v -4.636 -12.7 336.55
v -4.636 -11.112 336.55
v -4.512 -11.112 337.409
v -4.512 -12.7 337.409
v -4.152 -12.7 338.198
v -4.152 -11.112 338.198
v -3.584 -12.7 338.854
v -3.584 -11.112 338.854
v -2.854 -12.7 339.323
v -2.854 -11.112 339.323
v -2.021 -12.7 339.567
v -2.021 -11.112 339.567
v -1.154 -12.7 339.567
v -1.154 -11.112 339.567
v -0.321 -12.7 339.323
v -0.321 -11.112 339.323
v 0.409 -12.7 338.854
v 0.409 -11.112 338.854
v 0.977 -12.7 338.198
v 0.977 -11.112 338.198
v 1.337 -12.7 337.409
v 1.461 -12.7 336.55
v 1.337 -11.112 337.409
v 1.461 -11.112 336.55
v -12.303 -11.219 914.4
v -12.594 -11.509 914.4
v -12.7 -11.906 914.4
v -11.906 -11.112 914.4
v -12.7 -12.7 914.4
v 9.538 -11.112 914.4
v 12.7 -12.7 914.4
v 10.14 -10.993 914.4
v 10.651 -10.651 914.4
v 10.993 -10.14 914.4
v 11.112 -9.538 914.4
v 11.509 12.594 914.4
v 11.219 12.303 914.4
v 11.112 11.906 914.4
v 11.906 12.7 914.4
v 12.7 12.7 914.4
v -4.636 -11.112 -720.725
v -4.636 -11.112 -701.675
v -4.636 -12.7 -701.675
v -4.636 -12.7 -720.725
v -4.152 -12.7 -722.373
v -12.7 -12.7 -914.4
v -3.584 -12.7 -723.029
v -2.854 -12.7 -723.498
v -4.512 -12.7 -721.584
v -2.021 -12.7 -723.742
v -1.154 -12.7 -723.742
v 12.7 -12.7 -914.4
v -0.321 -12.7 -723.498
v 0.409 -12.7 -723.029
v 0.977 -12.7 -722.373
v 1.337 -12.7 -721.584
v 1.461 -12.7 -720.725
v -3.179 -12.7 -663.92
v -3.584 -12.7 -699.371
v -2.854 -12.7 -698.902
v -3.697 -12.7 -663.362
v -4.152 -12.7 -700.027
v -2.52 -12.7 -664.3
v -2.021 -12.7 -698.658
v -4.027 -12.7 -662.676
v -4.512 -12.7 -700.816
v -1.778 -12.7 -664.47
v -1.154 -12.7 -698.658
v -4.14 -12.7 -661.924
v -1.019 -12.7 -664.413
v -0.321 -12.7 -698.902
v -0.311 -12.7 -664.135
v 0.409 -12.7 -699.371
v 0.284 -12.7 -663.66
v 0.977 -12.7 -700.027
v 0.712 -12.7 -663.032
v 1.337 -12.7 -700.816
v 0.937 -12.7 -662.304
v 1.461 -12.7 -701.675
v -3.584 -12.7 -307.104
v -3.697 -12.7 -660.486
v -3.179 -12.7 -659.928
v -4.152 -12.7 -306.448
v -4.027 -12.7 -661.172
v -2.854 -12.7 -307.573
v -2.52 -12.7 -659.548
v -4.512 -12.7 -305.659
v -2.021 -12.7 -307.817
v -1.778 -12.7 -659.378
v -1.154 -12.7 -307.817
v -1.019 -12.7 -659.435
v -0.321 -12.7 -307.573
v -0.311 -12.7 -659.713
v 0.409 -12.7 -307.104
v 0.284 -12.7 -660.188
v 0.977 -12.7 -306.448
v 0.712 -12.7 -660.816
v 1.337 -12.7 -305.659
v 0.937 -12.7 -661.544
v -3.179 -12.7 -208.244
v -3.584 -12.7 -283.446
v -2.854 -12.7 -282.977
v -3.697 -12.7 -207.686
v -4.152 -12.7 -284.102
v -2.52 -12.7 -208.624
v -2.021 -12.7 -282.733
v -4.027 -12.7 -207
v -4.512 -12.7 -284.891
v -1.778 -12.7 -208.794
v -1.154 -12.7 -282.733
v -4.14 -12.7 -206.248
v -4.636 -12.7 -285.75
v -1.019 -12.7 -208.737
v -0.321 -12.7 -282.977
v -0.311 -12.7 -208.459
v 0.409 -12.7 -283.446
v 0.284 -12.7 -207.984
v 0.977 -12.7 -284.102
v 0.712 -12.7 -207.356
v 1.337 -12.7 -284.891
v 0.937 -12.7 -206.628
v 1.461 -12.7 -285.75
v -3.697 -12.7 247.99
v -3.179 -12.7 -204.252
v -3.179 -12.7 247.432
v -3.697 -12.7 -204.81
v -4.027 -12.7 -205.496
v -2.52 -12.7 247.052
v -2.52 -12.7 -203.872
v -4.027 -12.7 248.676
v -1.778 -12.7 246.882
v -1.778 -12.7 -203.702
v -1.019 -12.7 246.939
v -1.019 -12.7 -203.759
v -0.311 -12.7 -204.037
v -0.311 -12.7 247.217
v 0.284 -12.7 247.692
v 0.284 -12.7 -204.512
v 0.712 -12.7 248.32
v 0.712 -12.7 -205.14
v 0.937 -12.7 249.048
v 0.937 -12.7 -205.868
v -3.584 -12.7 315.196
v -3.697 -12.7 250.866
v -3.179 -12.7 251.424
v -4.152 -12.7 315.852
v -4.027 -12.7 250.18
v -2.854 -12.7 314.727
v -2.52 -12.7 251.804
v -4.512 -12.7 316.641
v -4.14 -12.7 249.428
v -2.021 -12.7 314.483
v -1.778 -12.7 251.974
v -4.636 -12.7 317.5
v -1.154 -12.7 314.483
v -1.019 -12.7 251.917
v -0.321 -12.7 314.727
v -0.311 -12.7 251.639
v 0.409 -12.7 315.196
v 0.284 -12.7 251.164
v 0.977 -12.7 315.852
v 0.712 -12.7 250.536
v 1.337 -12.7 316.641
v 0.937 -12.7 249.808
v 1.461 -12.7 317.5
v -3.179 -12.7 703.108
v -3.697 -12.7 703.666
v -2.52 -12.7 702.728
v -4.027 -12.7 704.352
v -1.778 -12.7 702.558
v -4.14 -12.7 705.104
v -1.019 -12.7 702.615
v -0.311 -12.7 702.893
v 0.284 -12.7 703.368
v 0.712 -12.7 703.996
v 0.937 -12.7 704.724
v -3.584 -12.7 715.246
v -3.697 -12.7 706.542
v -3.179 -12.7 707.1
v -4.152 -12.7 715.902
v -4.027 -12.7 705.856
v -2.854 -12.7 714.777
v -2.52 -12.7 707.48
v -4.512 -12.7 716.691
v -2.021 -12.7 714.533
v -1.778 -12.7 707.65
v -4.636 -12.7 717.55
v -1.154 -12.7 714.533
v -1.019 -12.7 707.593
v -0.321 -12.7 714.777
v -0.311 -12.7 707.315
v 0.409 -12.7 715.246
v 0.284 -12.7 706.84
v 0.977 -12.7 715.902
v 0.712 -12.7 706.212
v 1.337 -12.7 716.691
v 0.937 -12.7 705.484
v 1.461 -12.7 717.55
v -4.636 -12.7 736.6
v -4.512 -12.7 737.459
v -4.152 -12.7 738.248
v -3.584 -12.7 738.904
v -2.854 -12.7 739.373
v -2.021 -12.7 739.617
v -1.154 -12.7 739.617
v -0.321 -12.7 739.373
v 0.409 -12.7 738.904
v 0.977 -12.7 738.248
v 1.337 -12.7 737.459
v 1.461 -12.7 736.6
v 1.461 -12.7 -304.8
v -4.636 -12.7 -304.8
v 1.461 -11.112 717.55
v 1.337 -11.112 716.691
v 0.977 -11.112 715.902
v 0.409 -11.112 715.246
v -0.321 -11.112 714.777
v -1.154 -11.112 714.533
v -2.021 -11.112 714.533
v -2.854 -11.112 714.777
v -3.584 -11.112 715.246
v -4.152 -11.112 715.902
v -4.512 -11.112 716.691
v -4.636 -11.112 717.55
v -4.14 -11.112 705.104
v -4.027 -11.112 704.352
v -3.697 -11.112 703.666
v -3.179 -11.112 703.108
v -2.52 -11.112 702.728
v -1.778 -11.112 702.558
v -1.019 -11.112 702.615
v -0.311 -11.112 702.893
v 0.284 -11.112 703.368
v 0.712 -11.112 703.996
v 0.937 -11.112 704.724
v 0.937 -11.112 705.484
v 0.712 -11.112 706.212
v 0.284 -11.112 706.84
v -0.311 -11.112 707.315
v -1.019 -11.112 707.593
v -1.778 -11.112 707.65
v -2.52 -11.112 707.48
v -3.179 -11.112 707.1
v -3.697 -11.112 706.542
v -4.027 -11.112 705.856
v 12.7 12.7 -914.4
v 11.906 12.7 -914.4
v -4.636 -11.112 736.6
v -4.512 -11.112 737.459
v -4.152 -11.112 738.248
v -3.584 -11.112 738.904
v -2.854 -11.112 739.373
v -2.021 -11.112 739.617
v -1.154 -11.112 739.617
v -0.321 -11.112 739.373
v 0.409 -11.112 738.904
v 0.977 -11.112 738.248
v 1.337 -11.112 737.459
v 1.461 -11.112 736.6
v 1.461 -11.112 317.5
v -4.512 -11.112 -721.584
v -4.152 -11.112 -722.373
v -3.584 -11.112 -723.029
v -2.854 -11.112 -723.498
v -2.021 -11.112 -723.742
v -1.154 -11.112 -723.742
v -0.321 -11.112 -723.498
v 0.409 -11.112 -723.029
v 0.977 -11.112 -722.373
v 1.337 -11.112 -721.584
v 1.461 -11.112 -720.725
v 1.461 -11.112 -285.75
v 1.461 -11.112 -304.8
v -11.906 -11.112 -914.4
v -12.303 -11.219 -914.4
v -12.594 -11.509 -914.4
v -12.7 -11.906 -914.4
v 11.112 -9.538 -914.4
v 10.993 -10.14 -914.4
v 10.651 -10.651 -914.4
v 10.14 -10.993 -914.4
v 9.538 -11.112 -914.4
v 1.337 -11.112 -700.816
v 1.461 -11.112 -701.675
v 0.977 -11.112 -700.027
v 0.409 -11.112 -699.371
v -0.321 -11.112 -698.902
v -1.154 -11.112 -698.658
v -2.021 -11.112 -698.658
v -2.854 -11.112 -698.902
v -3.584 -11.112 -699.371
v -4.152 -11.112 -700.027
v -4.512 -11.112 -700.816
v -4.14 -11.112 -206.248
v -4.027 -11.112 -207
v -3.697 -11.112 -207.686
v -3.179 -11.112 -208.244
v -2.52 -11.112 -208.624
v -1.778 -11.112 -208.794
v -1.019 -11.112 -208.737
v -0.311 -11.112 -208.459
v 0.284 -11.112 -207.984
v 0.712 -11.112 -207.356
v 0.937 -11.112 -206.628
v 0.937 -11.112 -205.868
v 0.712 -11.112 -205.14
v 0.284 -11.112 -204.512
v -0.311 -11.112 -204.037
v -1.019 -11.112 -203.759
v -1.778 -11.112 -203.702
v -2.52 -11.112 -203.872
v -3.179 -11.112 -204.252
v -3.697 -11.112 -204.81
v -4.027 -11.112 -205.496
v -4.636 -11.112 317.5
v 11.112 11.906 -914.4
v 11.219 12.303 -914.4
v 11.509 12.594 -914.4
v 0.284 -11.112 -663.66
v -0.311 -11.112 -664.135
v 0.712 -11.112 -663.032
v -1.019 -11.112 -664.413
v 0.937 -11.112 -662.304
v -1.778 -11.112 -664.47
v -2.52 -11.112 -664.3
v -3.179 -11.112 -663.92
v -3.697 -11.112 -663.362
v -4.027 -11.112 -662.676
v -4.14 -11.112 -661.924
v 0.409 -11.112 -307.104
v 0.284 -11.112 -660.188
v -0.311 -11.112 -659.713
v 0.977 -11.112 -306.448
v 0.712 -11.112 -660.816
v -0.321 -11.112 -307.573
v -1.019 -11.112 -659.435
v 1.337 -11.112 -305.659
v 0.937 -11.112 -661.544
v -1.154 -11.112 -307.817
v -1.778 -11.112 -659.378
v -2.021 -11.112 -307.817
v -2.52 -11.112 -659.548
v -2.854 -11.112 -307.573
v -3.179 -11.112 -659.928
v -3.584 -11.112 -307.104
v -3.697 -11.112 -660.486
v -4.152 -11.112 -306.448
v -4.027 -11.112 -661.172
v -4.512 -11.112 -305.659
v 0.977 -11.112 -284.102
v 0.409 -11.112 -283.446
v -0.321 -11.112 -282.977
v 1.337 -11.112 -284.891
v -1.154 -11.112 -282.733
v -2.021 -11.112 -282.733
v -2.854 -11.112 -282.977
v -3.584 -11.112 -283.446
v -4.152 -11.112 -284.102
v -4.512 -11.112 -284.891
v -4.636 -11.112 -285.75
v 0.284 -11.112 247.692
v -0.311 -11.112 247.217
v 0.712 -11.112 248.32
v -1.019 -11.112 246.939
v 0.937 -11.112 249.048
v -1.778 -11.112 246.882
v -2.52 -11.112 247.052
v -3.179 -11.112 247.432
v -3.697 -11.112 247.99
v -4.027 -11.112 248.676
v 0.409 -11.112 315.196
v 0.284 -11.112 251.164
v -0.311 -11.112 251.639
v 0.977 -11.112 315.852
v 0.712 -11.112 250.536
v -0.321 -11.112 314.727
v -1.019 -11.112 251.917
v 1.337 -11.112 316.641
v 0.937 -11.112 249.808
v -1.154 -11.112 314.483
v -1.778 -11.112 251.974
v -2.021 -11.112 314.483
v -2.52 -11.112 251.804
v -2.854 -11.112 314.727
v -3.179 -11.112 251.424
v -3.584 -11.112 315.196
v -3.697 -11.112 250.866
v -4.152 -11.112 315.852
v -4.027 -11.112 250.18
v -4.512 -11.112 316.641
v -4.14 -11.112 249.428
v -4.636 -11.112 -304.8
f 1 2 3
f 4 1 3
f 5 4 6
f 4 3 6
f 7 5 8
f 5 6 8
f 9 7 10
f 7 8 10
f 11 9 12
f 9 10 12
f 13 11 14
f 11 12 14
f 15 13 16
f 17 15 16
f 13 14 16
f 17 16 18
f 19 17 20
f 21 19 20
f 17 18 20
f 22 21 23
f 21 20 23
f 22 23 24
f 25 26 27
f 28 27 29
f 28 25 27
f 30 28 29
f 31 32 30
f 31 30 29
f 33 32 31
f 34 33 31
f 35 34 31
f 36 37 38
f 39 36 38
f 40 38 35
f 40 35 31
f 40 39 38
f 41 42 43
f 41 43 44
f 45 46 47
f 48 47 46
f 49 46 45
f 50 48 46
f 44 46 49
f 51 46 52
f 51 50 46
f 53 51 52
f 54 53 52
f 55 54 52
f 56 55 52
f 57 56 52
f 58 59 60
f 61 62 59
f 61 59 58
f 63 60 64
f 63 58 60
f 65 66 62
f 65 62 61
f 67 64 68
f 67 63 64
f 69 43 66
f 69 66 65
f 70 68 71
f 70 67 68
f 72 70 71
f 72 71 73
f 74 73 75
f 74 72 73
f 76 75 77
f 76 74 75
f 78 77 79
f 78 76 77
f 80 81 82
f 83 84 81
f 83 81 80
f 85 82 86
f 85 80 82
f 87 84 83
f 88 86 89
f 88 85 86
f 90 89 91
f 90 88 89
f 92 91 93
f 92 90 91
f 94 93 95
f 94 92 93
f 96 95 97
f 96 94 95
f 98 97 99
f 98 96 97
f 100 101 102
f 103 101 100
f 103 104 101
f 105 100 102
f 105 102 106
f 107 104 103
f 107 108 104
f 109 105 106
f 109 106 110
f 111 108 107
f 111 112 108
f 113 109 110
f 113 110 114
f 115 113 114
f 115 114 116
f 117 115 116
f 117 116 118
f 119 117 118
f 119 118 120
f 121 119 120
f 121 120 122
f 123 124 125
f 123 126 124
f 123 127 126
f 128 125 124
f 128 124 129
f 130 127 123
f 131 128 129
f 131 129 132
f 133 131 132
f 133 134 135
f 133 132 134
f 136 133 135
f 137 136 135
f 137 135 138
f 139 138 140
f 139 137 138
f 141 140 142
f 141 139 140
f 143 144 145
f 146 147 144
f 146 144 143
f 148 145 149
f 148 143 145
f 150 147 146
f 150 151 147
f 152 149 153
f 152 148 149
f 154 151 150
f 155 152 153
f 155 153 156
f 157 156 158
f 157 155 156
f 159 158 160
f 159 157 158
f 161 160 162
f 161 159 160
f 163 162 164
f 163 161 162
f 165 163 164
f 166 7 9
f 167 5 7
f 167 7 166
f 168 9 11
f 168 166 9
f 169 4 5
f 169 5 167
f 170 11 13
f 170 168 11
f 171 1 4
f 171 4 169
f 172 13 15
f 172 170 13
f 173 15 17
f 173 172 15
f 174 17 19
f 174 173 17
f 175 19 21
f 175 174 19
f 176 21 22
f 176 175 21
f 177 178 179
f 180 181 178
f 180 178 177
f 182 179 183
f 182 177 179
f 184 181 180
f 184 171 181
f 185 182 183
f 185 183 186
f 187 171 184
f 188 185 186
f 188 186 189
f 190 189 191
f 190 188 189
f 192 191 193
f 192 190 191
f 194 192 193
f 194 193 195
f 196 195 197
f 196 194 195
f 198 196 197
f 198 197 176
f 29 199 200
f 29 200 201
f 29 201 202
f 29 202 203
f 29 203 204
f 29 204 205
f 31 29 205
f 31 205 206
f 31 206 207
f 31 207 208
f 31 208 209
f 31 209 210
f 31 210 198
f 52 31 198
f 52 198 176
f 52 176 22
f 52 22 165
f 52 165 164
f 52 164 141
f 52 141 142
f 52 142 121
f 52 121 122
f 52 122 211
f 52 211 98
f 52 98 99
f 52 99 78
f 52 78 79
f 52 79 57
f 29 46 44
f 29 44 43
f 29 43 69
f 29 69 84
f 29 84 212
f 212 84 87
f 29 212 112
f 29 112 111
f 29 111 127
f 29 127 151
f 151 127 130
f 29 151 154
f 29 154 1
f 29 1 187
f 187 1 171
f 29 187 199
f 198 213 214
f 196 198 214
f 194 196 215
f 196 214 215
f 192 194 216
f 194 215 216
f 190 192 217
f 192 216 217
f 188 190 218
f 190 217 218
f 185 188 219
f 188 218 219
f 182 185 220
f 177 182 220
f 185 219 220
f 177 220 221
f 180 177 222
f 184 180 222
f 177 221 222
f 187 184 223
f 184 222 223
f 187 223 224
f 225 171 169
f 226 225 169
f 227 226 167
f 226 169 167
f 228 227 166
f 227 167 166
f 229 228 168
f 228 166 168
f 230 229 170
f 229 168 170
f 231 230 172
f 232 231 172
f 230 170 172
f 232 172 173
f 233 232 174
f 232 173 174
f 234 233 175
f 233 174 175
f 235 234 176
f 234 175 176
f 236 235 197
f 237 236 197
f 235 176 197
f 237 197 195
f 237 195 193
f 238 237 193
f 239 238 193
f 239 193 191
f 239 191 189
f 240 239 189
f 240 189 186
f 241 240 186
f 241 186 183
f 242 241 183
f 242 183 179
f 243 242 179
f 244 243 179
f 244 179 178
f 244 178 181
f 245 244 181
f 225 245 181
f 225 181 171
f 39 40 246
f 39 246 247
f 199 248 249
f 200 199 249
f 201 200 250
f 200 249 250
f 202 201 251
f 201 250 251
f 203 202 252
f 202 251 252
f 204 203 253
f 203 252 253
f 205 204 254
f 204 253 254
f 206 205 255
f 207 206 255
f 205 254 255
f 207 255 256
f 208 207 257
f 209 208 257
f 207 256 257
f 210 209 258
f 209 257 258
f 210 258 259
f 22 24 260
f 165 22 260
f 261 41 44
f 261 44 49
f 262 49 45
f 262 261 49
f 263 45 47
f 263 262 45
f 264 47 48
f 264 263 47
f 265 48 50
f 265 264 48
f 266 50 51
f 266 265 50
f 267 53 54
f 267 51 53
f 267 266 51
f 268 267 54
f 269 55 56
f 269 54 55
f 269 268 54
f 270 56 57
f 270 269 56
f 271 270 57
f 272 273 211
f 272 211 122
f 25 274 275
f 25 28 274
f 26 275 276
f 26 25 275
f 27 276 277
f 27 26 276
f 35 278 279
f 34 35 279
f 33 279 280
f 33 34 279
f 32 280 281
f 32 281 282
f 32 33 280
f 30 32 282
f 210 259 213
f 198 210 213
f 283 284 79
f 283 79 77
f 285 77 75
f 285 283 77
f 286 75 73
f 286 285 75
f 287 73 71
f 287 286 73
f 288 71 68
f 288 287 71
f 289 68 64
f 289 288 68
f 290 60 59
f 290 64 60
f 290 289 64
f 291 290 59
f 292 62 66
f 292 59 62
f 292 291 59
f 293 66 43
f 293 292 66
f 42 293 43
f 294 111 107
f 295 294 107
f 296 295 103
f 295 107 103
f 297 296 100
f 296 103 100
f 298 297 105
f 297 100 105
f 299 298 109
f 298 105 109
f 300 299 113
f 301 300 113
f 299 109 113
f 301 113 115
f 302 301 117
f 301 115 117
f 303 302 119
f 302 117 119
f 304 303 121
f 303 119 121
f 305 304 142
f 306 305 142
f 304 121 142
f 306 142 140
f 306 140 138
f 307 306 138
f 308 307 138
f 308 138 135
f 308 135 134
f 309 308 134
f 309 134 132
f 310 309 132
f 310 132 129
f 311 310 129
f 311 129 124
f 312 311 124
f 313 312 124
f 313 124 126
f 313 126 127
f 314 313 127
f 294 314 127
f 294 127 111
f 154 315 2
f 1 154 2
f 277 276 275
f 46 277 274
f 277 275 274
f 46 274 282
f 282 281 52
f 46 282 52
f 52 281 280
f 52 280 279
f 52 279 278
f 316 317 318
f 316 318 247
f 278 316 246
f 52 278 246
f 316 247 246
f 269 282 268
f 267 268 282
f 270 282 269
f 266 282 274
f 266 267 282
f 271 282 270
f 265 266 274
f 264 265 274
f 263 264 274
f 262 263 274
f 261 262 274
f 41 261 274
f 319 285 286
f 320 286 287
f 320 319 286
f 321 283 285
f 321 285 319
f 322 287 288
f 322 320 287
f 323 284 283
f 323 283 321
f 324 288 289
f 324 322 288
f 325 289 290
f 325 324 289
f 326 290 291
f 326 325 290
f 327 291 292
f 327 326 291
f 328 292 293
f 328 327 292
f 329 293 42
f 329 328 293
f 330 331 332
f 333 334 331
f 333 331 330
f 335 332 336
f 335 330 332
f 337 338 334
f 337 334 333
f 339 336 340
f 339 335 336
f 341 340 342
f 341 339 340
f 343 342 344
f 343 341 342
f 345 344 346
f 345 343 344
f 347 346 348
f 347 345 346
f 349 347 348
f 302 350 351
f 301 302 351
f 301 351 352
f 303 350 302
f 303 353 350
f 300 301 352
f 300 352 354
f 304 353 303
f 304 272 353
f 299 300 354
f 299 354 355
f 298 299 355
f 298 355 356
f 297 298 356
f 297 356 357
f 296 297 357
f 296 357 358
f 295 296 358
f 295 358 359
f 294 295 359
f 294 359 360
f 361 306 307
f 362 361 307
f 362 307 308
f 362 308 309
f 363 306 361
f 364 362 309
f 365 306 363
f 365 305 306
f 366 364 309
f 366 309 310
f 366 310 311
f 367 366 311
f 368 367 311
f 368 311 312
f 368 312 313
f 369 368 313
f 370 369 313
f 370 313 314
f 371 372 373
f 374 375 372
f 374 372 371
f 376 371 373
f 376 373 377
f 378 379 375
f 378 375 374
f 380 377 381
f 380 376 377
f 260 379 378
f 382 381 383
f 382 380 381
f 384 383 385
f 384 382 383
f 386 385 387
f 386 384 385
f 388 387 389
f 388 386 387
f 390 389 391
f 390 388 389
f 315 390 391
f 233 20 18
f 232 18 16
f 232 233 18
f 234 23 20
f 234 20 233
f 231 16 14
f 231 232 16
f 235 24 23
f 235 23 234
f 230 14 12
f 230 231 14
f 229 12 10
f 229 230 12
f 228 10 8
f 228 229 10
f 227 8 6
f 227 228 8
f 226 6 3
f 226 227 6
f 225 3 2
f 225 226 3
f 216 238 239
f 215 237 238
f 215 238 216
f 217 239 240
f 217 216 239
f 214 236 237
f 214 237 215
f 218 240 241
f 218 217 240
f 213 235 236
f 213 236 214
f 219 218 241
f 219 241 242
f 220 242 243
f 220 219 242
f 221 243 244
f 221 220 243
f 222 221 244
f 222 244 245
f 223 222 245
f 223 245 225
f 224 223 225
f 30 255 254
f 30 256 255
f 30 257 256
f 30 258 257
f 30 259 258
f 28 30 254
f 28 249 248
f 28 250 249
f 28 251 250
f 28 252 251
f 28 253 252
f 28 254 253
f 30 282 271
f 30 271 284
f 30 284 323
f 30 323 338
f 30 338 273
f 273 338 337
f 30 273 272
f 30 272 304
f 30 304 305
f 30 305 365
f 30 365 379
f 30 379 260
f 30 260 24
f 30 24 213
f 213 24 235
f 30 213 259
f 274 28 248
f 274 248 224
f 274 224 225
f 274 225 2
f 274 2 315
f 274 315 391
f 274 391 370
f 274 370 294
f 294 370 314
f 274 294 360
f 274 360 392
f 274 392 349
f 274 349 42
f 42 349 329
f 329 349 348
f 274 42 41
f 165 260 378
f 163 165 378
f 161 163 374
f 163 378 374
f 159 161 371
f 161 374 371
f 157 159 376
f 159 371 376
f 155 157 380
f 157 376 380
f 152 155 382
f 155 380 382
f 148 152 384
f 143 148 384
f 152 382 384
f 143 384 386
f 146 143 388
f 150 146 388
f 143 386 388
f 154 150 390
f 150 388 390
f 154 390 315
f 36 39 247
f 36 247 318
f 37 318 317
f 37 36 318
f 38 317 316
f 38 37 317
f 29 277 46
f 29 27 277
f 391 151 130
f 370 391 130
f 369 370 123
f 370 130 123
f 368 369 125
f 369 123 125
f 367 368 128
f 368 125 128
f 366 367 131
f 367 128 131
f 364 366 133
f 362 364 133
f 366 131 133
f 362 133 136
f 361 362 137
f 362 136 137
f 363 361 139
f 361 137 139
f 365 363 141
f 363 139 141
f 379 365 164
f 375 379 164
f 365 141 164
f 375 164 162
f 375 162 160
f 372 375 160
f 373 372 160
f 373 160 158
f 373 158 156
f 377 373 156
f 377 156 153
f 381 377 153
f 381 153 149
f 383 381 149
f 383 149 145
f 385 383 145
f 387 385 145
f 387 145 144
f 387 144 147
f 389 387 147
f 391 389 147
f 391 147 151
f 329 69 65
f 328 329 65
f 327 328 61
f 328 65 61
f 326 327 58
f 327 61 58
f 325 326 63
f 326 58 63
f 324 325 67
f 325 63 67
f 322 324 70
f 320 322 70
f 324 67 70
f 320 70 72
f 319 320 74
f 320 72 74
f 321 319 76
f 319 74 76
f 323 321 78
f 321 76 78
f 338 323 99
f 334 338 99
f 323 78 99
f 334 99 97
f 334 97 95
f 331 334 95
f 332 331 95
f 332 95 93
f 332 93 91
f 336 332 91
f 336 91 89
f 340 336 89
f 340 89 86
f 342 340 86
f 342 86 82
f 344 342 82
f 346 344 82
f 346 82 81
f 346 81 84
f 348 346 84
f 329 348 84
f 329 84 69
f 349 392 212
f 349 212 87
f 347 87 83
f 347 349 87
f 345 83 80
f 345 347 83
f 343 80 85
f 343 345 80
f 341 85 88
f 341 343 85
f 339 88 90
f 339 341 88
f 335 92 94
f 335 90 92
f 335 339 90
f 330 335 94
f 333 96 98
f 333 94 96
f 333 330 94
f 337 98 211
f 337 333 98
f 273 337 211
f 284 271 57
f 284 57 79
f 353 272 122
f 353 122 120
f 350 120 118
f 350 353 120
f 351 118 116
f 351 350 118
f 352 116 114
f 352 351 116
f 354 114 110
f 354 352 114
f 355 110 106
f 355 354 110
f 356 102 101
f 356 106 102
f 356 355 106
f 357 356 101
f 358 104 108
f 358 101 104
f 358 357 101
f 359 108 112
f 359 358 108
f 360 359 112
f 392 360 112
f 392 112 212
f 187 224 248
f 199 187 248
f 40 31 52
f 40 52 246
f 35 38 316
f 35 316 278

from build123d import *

# Parameters (mm, degrees)
BOSS_EXTRUDE1_DEPTH     = 914.4
F_1_4_20_TAPPED_HOLE1_D = 5.1054
CUT_EXTRUDE1_DEPTH      = 915.798166349


with BuildPart() as part:
    # Sketch2 → Boss-Extrude1 (new, symmetric)
    with BuildSketch(Plane.XY):
        with BuildLine():
            Line((-12.7, -12.7), (12.7, -12.7))
            Line((12.7, -12.7), (12.7, 12.7))
            Line((12.7, 12.7), (11.90625, 12.7))
            ThreePointArc((11.90625, 12.7), (11.344983992, 12.467516008), (11.1125, 11.90625))
            Line((11.1125, 11.90625), (11.1125, -9.5377))
            ThreePointArc((11.1125, -9.5377), (10.651251759, -10.651251759), (9.5377, -11.1125))
            Line((9.5377, -11.1125), (-11.90625, -11.1125))
            ThreePointArc((-11.90625, -11.1125), (-12.467516008, -11.344983992), (-12.7, -11.90625))
            Line((-12.7, -11.90625), (-12.7, -12.7))
        make_face()
    extrude(amount=BOSS_EXTRUDE1_DEPTH, both=True)

    # 1/4-20 Tapped Hole1 (through all)
    with Locations(Plane(origin=(0, -11.1125, 0), x_dir=(1, 0, 0), z_dir=(0, 1, 0))):
        with Locations((-1.5875, -705.104), (-1.5875, -249.428), (-1.5875, 661.924), (-1.5875, 206.248)):
            Hole(F_1_4_20_TAPPED_HOLE1_D / 2)

    # Sketch5 → Cut-Extrude1 (cut, through all)
    with BuildSketch(Plane(origin=(0, -11.1125, 0), x_dir=(1, 0, 0), z_dir=(0, 1, 0))):
        with BuildLine():
            Line((-4.6355, 701.675), (-4.6355, 720.725))
            ThreePointArc((-4.6355, 720.725), (-1.5875, 723.773), (1.4605, 720.725))
            Line((1.4605, 720.725), (1.4605, 701.675))
            ThreePointArc((1.4605, 701.675), (-1.5875, 698.627), (-4.6355, 701.675))
        make_face()
        with BuildLine():
            Line((1.4605, 304.8), (1.4605, 285.75))
            ThreePointArc((1.4605, 285.75), (-1.5875, 282.702), (-4.6355, 285.75))
            Line((-4.6355, 285.75), (-4.6355, 304.8))
            ThreePointArc((-4.6355, 304.8), (-1.5875, 307.848), (1.4605, 304.8))
        make_face()
        with BuildLine():
            Line((1.4605, -336.55), (1.4605, -317.5))
            ThreePointArc((1.4605, -317.5), (-1.5875, -314.452), (-4.6355, -317.5))
            Line((-4.6355, -317.5), (-4.6355, -336.55))
            ThreePointArc((-4.6355, -336.55), (-1.5875, -339.598), (1.4605, -336.55))
        make_face()
        with BuildLine():
            Line((-4.6355, -717.55), (-4.6355, -736.6))
            ThreePointArc((-4.6355, -736.6), (-1.5875, -739.648), (1.4605, -736.6))
            Line((1.4605, -736.6), (1.4605, -717.55))
            ThreePointArc((1.4605, -717.55), (-1.5875, -714.502), (-4.6355, -717.55))
        make_face()
    extrude(amount=-CUT_EXTRUDE1_DEPTH, mode=Mode.SUBTRACT)


solid = part.part
